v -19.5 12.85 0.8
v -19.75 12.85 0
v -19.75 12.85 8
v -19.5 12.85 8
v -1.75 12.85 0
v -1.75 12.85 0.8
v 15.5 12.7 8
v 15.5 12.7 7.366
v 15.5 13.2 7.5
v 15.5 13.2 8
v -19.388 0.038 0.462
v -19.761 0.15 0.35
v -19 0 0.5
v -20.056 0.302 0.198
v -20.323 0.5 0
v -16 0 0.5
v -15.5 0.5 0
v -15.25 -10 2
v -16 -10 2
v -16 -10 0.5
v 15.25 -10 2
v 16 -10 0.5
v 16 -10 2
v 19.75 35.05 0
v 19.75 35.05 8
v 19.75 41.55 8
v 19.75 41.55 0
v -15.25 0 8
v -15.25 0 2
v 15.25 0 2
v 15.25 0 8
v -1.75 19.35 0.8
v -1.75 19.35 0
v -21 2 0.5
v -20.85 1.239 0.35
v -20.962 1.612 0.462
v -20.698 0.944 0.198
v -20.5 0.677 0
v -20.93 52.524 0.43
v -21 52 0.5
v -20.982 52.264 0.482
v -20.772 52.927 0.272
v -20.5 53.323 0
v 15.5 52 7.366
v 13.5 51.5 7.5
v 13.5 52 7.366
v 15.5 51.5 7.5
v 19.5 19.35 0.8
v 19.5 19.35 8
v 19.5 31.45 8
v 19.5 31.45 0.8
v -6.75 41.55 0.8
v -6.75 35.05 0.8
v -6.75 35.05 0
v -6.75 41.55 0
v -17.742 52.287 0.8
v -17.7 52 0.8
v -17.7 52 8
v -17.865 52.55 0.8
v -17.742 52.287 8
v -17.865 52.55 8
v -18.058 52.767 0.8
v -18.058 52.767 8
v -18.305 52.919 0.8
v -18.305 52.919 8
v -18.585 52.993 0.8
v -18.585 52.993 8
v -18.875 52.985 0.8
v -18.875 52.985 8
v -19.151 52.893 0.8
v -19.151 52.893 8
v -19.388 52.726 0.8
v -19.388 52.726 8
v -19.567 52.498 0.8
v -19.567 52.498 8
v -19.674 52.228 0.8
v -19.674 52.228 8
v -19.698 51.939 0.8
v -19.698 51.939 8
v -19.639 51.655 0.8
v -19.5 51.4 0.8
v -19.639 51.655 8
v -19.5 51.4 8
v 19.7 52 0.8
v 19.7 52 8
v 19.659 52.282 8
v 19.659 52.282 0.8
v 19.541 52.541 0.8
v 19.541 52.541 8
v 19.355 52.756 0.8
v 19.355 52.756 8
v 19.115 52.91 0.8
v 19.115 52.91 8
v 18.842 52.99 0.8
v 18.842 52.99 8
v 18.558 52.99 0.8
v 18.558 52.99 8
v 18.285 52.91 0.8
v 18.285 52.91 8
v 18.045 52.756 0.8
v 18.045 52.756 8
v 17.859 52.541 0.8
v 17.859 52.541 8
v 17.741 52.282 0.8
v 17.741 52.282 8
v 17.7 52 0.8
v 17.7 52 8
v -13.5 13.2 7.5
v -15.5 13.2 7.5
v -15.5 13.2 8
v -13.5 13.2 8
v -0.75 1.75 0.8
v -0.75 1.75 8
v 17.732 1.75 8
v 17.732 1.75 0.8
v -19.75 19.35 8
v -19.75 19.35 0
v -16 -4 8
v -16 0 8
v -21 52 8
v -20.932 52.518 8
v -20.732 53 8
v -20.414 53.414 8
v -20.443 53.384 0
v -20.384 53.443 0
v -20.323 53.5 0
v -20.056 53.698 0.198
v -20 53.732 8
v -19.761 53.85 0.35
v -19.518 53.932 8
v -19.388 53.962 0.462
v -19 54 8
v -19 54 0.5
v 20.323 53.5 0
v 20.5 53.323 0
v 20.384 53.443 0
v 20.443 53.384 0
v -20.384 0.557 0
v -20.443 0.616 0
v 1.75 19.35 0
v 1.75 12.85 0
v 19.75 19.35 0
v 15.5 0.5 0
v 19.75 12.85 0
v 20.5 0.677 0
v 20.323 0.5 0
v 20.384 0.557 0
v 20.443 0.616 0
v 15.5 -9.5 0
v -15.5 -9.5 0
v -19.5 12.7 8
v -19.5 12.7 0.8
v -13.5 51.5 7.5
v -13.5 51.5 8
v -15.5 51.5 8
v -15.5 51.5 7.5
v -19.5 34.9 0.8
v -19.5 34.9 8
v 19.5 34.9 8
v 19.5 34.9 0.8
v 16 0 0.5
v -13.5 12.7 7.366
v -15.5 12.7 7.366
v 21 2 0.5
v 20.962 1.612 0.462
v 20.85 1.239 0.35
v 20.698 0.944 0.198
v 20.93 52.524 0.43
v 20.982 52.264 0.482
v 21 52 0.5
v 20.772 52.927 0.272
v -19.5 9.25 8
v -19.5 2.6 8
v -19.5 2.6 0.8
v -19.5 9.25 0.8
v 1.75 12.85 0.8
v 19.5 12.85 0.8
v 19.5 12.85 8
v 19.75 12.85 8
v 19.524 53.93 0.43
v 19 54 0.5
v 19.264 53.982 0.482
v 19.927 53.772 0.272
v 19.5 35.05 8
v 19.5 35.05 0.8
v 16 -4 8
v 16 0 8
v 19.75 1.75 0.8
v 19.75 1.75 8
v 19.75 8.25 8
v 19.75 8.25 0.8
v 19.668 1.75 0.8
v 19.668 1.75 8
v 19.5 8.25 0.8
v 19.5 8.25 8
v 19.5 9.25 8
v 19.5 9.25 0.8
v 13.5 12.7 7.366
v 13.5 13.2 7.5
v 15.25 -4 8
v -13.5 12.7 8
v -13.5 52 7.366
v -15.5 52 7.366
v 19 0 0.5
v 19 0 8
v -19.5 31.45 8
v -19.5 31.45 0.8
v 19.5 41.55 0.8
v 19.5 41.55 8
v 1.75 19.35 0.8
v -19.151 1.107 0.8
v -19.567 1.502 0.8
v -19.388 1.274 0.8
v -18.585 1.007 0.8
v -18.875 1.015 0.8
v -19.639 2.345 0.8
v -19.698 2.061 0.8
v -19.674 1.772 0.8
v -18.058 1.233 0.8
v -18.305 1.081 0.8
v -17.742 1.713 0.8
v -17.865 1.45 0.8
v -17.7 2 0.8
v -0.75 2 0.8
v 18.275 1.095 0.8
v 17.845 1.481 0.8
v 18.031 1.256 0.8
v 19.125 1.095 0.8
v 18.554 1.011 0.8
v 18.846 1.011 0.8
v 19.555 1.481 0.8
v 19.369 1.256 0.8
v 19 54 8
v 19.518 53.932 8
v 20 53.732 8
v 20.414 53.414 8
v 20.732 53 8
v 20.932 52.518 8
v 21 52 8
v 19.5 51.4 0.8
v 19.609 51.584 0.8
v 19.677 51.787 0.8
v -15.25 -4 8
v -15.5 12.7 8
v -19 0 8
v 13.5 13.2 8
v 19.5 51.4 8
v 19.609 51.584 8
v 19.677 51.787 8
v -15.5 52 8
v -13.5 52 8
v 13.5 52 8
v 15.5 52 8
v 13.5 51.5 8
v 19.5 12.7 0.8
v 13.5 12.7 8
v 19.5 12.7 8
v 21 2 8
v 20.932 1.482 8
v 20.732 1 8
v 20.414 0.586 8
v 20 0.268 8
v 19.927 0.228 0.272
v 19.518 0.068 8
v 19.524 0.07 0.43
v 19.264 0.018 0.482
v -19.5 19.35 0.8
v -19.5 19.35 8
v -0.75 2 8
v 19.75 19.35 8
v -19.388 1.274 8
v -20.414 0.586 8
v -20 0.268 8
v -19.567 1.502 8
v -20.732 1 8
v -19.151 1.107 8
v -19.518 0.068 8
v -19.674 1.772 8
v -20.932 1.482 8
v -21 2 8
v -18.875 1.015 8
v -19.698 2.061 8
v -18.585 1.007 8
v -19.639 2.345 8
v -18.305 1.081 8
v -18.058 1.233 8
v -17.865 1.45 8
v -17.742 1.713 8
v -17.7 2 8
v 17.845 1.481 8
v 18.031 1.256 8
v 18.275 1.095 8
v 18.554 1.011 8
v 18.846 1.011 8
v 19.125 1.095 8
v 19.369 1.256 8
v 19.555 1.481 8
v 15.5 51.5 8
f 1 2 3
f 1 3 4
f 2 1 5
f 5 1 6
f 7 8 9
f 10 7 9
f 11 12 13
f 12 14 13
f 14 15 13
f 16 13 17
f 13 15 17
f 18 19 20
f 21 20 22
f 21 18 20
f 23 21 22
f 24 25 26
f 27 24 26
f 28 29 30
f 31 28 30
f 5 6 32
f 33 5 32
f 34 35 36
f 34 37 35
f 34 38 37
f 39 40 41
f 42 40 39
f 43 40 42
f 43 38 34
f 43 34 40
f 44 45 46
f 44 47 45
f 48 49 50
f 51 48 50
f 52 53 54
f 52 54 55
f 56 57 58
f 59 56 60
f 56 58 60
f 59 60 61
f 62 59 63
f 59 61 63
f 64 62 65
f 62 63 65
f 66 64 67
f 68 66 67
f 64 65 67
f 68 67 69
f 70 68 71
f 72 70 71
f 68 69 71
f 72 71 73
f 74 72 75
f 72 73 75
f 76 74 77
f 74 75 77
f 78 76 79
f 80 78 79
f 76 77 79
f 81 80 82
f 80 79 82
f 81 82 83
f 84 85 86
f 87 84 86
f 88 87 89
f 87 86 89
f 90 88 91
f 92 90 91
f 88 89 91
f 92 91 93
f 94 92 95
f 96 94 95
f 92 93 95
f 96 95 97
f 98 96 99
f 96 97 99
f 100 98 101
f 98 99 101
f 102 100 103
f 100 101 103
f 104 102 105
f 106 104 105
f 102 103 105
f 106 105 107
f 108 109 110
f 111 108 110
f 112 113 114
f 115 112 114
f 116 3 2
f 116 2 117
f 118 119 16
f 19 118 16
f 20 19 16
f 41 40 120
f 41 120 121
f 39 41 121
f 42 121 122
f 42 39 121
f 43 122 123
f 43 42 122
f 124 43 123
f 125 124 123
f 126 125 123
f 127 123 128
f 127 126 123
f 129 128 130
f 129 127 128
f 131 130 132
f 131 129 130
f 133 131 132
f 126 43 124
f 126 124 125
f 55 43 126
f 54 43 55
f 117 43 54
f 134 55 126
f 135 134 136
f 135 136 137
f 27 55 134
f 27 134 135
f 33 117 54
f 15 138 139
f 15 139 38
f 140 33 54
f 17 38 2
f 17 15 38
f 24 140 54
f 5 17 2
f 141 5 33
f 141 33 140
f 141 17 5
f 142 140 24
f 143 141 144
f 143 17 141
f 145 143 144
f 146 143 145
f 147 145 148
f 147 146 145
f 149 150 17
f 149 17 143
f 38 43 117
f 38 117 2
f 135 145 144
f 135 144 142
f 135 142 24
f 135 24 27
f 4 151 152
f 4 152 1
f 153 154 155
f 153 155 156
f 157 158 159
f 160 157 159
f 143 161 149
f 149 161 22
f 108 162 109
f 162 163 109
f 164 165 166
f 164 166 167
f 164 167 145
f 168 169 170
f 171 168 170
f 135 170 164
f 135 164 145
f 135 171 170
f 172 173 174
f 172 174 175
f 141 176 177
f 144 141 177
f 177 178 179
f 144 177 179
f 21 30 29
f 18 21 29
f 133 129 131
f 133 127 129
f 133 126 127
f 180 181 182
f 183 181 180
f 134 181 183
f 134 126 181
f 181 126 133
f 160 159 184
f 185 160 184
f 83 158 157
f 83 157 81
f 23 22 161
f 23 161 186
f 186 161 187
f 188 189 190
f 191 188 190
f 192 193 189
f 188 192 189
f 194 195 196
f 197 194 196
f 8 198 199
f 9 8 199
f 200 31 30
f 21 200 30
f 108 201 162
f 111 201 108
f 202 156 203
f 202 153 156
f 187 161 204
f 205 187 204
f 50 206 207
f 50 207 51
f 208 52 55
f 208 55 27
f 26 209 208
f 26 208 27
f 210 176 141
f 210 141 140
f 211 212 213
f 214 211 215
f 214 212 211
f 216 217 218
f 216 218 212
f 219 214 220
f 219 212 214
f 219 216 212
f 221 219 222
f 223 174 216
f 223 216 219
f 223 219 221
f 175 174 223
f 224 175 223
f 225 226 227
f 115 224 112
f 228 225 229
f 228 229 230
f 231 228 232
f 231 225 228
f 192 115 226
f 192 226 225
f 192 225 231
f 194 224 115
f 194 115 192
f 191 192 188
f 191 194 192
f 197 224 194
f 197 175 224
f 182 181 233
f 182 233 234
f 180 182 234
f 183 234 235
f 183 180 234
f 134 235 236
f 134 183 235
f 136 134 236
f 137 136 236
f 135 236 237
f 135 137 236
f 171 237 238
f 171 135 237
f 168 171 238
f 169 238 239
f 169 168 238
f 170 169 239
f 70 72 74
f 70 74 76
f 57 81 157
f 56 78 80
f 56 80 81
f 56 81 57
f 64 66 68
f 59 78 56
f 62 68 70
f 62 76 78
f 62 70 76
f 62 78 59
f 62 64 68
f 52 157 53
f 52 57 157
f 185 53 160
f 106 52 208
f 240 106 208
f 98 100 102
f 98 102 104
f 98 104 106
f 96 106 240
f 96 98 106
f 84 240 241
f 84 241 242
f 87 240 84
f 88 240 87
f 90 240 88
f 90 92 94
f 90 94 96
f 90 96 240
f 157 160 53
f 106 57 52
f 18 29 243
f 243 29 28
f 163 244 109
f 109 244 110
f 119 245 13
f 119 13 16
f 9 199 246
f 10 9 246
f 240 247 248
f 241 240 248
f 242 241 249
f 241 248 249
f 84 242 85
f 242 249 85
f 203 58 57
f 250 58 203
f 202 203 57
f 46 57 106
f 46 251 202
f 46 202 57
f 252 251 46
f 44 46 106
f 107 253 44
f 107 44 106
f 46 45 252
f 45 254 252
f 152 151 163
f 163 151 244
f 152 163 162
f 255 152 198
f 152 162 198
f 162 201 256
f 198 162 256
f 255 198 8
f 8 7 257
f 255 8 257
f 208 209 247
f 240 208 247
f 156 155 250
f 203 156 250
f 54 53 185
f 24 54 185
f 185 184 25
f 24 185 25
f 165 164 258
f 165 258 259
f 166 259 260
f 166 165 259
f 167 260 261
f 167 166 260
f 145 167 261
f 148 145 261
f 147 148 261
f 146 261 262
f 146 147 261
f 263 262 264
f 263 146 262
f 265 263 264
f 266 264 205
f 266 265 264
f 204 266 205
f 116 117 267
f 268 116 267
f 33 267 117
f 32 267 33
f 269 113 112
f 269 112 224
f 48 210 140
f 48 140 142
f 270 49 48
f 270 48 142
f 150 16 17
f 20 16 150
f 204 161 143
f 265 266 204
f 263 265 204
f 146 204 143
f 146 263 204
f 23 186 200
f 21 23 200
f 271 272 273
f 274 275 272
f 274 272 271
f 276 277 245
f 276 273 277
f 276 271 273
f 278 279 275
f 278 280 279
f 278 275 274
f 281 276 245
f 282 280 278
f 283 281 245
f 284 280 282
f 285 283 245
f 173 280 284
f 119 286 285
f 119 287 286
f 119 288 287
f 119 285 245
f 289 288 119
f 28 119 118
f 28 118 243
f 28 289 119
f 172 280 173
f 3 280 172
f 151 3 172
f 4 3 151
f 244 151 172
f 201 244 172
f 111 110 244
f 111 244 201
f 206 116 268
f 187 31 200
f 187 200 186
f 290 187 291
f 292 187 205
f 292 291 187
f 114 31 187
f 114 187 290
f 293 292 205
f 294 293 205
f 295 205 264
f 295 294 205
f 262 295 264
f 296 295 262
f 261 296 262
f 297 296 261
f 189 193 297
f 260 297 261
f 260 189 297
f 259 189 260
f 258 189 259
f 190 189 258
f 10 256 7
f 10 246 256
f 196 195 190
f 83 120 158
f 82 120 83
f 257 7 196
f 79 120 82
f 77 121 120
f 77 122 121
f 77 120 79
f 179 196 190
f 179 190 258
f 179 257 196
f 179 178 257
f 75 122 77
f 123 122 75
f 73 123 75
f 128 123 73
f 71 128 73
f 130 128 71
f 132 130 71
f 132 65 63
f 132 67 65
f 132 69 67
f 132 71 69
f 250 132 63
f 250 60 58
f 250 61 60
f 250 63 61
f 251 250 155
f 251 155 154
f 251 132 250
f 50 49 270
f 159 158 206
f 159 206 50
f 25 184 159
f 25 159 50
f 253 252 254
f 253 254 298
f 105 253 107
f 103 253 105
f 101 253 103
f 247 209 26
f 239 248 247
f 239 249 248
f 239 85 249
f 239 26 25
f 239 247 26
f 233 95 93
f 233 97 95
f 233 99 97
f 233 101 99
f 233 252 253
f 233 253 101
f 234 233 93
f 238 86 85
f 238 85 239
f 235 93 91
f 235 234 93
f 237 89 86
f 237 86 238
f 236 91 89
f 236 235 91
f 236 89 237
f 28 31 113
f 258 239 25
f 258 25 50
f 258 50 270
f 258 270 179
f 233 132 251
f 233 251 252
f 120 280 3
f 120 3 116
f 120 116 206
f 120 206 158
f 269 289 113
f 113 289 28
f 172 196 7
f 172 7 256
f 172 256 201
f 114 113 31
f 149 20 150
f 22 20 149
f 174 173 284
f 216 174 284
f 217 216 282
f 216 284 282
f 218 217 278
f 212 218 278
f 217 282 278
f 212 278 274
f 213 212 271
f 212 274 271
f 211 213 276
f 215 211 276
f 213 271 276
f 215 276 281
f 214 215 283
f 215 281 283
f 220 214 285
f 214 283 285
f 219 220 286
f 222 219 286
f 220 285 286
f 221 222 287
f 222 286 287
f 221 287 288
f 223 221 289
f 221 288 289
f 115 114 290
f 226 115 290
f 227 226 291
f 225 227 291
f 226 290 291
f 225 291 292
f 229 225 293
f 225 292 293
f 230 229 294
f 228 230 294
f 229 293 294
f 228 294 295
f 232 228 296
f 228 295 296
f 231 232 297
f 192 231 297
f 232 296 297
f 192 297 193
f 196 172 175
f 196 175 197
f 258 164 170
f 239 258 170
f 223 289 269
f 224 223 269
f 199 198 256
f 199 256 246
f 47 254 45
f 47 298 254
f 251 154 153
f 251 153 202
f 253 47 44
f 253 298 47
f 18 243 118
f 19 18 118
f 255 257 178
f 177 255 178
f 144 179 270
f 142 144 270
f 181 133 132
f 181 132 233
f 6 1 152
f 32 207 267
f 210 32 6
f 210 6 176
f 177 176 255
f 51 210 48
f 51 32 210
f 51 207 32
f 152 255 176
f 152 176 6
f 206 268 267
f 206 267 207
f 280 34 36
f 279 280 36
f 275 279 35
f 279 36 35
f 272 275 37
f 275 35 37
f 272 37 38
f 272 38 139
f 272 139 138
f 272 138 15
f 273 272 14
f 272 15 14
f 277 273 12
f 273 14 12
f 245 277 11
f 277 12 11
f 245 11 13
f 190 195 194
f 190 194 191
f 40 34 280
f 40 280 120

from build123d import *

# Parameters (mm, degrees)
F0_W         = 42
F0_H         = 54
F1_DEPTH     = 8
F2_W         = 39
F2_H         = 50
F3_DEPTH     = 7.2
F5_DEPTH     = 7.2
F6_W         = 20.5
F6_H         = 6.5
F6_W_2       = 18
F6_W_3       = 26.5
F7_DEPTH     = 8.001
F9_DEPTH     = 10
F10_SIZE     = 0.5
F11_T1_DEPTH = 17.5
F12_W        = 39
F12_H        = 3.45
F13_DEPTH    = 7.2
F16_DEPTH    = 1
F19_DEPTH    = 1
F20_SIZE     = 6
F22_W        = 20.5
F22_H        = 6.5
F23_DEPTH    = 0.8


# Not quite as in the source:
# - a fillet or chamfer that OpenCascade refuses, or shapes differently, is made with other operations: its cross-section is extruded or revolved along the edge and cut away or added


with BuildPart() as f1:
    # F0 (on Top) → F1 (new body)
    with BuildSketch(Plane.XY):
        with Locations((0, 27)):
            Rectangle(F0_W, F0_H)
    extrude(amount=F1_DEPTH)

    # F2 (on face) → F3 (cut)
    with BuildSketch(Plane.XY.offset(8)):
        with Locations((0, 27)):
            Rectangle(F2_W, F2_H)
    extrude(amount=-F3_DEPTH, mode=Mode.SUBTRACT)

    # F4 (on face) → F5 (cut, through all)
    with BuildSketch(Plane.XY.offset(8)):
        with BuildLine():
            Line((-19.5, 52), (-17.7, 52))
            ThreePointArc((-17.7, 52), (-19.016227766, 52.9486832981), (-19.5, 51.4))
            Line((-19.5, 51.4), (-19.5, 52))
        make_face()
        with BuildLine():
            ThreePointArc((-19.5, 51.4), (-18.383772234, 51.0513167019), (-17.7, 52))
            Line((-17.7, 52), (-19.5, 52))
            Line((-19.5, 52), (-19.5, 51.4))
        make_face()
        with BuildLine():
            Line((19.5, 52), (17.7, 52))
            ThreePointArc((17.7, 52), (18.383772234, 51.0513167019), (19.5, 51.4))
            Line((19.5, 51.4), (19.5, 52))
        make_face()
        with BuildLine():
            ThreePointArc((19.7, 52), (18.7, 53), (17.7, 52))
            Line((17.7, 52), (19.5, 52))
            Line((19.5, 52), (19.5, 51.4))
            ThreePointArc((19.5, 51.4), (19.6486832981, 51.683772234), (19.7, 52))
        make_face()
        with BuildLine():
            Line((19.5, 2), (19.5, 2.6))
            ThreePointArc((19.5, 2.6), (18.383772234, 2.9486832981), (17.7, 2))
            Line((17.7, 2), (19.5, 2))
        make_face()
        with BuildLine():
            ThreePointArc((-17.7, 2), (-18.383772234, 2.9486832981), (-19.5, 2.6))
            Line((-19.5, 2.6), (-19.5, 2))
            Line((-19.5, 2), (-17.7, 2))
        make_face()
        with BuildLine():
            Line((-19.5, 2), (-19.5, 2.6))
            ThreePointArc((-19.5, 2.6), (-19.016227766, 1.0513167019), (-17.7, 2))
            Line((-17.7, 2), (-19.5, 2))
        make_face()
        with BuildLine():
            ThreePointArc((19.7, 2), (19.6486832981, 2.316227766), (19.5, 2.6))
            Line((19.5, 2.6), (19.5, 2))
            Line((19.5, 2), (17.7, 2))
            ThreePointArc((17.7, 2), (18.7, 1), (19.7, 2))
        make_face()
    extrude(amount=-F5_DEPTH, mode=Mode.SUBTRACT)

    # F6 (on face) → F7 (cut, through all)
    with BuildSketch(Plane.XY.offset(8)):
        with Locations((9.5, 5)):
            Rectangle(F6_W, F6_H)
        with Locations((10.75, 16.1)):
            Rectangle(F6_W_2, F6_H)
        with Locations((-10.75, 16.1)):
            Rectangle(F6_W_2, F6_H)
        with Locations((6.5, 38.3)):
            Rectangle(F6_W_3, F6_H)
    extrude(amount=-F7_DEPTH, mode=Mode.SUBTRACT)

    # F8 (on face) → F9 (join)
    with BuildSketch(Plane.XZ):
        Polygon((-15.25, 2), (-15.25, 8), (-16, 8), (-16, 0), (16, 0), (16, 8), (15.25, 8), (15.25, 2), align=None)
    extrude(amount=F9_DEPTH)

    # F10
    f10_edges = [f1.edges().sort_by_distance(p)[0] for p in [
        (16, -5, 0),
        (18.5, 0, 0),
        (21, 27, 0),
        (-16, -5, 0),
        (-18.5, 0, 0),
        (-21, 27, 0),
        (0, 54, 0),
        (0, -10, 0),
    ]]
    chamfer(f10_edges, length=F10_SIZE)

    # F11: fillet of radius 2 on 4 edges, made by hand

    # F11_s2 → F11_t1 (cut)
    with BuildSketch(Plane.XY.offset(-4.5)):
        with BuildLine():
            ThreePointArc((21, 2), (20.4142135624, 0.5857864376), (19, 0))
            Line((19, 0), (21, 0))
            Line((21, 0), (21, 2))
        make_face()
        with BuildLine():
            ThreePointArc((19, 54), (20.4142135624, 53.4142135624), (21, 52))
            Line((21, 52), (21, 54))
            Line((21, 54), (19, 54))
        make_face()
        with BuildLine():
            ThreePointArc((-21, 2), (-20.4142135624, 0.5857864376), (-19, 0))
            Line((-19, 0), (-21, 0))
            Line((-21, 0), (-21, 2))
        make_face()
        with BuildLine():
            ThreePointArc((-21, 52), (-20.4142135624, 53.4142135624), (-19, 54))
            Line((-19, 54), (-21, 54))
            Line((-21, 54), (-21, 52))
        make_face()
    extrude(amount=F11_T1_DEPTH, mode=Mode.SUBTRACT)

    # F12 (on face) → F13 (join, through all)
    with BuildSketch(Plane.XY.offset(8)):
        with Locations((0, 10.975)):
            Rectangle(F12_W, F12_H)
        with Locations((0, 33.175)):
            Rectangle(F12_W, F12_H)
    extrude(amount=-F13_DEPTH)

    # F15 (on offset) → F16 (join, symmetric)
    with BuildSketch(Plane.YZ.offset(-14.5)):
        Polygon((13.2, 8), (12.7, 8), (12.7, 7.3660254038), (13.2, 7.5), align=None)
        Polygon((52, 7.3660254038), (52, 8), (51.5, 8), (51.5, 7.5), align=None)
    extrude(amount=F16_DEPTH, both=True)

    # F18 (on offset) → F19 (join, symmetric)
    with BuildSketch(Plane.YZ.offset(14.5)):
        Polygon((13.2, 7.5), (13.2, 8), (12.7, 8), (12.7, 7.3660254038), align=None)
        Polygon((51.5, 7.5), (52, 7.3660254038), (52, 8), (51.5, 8), align=None)
    extrude(amount=F19_DEPTH, both=True)

    # F20
    f20_edges = [f1.edges().sort_by_distance(p)[0] for p in [
        (-15.625, -10, 8),
        (15.625, -10, 8),
    ]]
    chamfer(f20_edges, length=F20_SIZE)

    # F22 (on face) → F23 (join)
    with BuildSketch(Plane(origin=(0, 0, 0), x_dir=(1, 0, 0), z_dir=(0, 0, -1))):
        with Locations((9.5, -5)):
            Rectangle(F22_W, F22_H)
    extrude(amount=-F23_DEPTH)


solid = f1.part
